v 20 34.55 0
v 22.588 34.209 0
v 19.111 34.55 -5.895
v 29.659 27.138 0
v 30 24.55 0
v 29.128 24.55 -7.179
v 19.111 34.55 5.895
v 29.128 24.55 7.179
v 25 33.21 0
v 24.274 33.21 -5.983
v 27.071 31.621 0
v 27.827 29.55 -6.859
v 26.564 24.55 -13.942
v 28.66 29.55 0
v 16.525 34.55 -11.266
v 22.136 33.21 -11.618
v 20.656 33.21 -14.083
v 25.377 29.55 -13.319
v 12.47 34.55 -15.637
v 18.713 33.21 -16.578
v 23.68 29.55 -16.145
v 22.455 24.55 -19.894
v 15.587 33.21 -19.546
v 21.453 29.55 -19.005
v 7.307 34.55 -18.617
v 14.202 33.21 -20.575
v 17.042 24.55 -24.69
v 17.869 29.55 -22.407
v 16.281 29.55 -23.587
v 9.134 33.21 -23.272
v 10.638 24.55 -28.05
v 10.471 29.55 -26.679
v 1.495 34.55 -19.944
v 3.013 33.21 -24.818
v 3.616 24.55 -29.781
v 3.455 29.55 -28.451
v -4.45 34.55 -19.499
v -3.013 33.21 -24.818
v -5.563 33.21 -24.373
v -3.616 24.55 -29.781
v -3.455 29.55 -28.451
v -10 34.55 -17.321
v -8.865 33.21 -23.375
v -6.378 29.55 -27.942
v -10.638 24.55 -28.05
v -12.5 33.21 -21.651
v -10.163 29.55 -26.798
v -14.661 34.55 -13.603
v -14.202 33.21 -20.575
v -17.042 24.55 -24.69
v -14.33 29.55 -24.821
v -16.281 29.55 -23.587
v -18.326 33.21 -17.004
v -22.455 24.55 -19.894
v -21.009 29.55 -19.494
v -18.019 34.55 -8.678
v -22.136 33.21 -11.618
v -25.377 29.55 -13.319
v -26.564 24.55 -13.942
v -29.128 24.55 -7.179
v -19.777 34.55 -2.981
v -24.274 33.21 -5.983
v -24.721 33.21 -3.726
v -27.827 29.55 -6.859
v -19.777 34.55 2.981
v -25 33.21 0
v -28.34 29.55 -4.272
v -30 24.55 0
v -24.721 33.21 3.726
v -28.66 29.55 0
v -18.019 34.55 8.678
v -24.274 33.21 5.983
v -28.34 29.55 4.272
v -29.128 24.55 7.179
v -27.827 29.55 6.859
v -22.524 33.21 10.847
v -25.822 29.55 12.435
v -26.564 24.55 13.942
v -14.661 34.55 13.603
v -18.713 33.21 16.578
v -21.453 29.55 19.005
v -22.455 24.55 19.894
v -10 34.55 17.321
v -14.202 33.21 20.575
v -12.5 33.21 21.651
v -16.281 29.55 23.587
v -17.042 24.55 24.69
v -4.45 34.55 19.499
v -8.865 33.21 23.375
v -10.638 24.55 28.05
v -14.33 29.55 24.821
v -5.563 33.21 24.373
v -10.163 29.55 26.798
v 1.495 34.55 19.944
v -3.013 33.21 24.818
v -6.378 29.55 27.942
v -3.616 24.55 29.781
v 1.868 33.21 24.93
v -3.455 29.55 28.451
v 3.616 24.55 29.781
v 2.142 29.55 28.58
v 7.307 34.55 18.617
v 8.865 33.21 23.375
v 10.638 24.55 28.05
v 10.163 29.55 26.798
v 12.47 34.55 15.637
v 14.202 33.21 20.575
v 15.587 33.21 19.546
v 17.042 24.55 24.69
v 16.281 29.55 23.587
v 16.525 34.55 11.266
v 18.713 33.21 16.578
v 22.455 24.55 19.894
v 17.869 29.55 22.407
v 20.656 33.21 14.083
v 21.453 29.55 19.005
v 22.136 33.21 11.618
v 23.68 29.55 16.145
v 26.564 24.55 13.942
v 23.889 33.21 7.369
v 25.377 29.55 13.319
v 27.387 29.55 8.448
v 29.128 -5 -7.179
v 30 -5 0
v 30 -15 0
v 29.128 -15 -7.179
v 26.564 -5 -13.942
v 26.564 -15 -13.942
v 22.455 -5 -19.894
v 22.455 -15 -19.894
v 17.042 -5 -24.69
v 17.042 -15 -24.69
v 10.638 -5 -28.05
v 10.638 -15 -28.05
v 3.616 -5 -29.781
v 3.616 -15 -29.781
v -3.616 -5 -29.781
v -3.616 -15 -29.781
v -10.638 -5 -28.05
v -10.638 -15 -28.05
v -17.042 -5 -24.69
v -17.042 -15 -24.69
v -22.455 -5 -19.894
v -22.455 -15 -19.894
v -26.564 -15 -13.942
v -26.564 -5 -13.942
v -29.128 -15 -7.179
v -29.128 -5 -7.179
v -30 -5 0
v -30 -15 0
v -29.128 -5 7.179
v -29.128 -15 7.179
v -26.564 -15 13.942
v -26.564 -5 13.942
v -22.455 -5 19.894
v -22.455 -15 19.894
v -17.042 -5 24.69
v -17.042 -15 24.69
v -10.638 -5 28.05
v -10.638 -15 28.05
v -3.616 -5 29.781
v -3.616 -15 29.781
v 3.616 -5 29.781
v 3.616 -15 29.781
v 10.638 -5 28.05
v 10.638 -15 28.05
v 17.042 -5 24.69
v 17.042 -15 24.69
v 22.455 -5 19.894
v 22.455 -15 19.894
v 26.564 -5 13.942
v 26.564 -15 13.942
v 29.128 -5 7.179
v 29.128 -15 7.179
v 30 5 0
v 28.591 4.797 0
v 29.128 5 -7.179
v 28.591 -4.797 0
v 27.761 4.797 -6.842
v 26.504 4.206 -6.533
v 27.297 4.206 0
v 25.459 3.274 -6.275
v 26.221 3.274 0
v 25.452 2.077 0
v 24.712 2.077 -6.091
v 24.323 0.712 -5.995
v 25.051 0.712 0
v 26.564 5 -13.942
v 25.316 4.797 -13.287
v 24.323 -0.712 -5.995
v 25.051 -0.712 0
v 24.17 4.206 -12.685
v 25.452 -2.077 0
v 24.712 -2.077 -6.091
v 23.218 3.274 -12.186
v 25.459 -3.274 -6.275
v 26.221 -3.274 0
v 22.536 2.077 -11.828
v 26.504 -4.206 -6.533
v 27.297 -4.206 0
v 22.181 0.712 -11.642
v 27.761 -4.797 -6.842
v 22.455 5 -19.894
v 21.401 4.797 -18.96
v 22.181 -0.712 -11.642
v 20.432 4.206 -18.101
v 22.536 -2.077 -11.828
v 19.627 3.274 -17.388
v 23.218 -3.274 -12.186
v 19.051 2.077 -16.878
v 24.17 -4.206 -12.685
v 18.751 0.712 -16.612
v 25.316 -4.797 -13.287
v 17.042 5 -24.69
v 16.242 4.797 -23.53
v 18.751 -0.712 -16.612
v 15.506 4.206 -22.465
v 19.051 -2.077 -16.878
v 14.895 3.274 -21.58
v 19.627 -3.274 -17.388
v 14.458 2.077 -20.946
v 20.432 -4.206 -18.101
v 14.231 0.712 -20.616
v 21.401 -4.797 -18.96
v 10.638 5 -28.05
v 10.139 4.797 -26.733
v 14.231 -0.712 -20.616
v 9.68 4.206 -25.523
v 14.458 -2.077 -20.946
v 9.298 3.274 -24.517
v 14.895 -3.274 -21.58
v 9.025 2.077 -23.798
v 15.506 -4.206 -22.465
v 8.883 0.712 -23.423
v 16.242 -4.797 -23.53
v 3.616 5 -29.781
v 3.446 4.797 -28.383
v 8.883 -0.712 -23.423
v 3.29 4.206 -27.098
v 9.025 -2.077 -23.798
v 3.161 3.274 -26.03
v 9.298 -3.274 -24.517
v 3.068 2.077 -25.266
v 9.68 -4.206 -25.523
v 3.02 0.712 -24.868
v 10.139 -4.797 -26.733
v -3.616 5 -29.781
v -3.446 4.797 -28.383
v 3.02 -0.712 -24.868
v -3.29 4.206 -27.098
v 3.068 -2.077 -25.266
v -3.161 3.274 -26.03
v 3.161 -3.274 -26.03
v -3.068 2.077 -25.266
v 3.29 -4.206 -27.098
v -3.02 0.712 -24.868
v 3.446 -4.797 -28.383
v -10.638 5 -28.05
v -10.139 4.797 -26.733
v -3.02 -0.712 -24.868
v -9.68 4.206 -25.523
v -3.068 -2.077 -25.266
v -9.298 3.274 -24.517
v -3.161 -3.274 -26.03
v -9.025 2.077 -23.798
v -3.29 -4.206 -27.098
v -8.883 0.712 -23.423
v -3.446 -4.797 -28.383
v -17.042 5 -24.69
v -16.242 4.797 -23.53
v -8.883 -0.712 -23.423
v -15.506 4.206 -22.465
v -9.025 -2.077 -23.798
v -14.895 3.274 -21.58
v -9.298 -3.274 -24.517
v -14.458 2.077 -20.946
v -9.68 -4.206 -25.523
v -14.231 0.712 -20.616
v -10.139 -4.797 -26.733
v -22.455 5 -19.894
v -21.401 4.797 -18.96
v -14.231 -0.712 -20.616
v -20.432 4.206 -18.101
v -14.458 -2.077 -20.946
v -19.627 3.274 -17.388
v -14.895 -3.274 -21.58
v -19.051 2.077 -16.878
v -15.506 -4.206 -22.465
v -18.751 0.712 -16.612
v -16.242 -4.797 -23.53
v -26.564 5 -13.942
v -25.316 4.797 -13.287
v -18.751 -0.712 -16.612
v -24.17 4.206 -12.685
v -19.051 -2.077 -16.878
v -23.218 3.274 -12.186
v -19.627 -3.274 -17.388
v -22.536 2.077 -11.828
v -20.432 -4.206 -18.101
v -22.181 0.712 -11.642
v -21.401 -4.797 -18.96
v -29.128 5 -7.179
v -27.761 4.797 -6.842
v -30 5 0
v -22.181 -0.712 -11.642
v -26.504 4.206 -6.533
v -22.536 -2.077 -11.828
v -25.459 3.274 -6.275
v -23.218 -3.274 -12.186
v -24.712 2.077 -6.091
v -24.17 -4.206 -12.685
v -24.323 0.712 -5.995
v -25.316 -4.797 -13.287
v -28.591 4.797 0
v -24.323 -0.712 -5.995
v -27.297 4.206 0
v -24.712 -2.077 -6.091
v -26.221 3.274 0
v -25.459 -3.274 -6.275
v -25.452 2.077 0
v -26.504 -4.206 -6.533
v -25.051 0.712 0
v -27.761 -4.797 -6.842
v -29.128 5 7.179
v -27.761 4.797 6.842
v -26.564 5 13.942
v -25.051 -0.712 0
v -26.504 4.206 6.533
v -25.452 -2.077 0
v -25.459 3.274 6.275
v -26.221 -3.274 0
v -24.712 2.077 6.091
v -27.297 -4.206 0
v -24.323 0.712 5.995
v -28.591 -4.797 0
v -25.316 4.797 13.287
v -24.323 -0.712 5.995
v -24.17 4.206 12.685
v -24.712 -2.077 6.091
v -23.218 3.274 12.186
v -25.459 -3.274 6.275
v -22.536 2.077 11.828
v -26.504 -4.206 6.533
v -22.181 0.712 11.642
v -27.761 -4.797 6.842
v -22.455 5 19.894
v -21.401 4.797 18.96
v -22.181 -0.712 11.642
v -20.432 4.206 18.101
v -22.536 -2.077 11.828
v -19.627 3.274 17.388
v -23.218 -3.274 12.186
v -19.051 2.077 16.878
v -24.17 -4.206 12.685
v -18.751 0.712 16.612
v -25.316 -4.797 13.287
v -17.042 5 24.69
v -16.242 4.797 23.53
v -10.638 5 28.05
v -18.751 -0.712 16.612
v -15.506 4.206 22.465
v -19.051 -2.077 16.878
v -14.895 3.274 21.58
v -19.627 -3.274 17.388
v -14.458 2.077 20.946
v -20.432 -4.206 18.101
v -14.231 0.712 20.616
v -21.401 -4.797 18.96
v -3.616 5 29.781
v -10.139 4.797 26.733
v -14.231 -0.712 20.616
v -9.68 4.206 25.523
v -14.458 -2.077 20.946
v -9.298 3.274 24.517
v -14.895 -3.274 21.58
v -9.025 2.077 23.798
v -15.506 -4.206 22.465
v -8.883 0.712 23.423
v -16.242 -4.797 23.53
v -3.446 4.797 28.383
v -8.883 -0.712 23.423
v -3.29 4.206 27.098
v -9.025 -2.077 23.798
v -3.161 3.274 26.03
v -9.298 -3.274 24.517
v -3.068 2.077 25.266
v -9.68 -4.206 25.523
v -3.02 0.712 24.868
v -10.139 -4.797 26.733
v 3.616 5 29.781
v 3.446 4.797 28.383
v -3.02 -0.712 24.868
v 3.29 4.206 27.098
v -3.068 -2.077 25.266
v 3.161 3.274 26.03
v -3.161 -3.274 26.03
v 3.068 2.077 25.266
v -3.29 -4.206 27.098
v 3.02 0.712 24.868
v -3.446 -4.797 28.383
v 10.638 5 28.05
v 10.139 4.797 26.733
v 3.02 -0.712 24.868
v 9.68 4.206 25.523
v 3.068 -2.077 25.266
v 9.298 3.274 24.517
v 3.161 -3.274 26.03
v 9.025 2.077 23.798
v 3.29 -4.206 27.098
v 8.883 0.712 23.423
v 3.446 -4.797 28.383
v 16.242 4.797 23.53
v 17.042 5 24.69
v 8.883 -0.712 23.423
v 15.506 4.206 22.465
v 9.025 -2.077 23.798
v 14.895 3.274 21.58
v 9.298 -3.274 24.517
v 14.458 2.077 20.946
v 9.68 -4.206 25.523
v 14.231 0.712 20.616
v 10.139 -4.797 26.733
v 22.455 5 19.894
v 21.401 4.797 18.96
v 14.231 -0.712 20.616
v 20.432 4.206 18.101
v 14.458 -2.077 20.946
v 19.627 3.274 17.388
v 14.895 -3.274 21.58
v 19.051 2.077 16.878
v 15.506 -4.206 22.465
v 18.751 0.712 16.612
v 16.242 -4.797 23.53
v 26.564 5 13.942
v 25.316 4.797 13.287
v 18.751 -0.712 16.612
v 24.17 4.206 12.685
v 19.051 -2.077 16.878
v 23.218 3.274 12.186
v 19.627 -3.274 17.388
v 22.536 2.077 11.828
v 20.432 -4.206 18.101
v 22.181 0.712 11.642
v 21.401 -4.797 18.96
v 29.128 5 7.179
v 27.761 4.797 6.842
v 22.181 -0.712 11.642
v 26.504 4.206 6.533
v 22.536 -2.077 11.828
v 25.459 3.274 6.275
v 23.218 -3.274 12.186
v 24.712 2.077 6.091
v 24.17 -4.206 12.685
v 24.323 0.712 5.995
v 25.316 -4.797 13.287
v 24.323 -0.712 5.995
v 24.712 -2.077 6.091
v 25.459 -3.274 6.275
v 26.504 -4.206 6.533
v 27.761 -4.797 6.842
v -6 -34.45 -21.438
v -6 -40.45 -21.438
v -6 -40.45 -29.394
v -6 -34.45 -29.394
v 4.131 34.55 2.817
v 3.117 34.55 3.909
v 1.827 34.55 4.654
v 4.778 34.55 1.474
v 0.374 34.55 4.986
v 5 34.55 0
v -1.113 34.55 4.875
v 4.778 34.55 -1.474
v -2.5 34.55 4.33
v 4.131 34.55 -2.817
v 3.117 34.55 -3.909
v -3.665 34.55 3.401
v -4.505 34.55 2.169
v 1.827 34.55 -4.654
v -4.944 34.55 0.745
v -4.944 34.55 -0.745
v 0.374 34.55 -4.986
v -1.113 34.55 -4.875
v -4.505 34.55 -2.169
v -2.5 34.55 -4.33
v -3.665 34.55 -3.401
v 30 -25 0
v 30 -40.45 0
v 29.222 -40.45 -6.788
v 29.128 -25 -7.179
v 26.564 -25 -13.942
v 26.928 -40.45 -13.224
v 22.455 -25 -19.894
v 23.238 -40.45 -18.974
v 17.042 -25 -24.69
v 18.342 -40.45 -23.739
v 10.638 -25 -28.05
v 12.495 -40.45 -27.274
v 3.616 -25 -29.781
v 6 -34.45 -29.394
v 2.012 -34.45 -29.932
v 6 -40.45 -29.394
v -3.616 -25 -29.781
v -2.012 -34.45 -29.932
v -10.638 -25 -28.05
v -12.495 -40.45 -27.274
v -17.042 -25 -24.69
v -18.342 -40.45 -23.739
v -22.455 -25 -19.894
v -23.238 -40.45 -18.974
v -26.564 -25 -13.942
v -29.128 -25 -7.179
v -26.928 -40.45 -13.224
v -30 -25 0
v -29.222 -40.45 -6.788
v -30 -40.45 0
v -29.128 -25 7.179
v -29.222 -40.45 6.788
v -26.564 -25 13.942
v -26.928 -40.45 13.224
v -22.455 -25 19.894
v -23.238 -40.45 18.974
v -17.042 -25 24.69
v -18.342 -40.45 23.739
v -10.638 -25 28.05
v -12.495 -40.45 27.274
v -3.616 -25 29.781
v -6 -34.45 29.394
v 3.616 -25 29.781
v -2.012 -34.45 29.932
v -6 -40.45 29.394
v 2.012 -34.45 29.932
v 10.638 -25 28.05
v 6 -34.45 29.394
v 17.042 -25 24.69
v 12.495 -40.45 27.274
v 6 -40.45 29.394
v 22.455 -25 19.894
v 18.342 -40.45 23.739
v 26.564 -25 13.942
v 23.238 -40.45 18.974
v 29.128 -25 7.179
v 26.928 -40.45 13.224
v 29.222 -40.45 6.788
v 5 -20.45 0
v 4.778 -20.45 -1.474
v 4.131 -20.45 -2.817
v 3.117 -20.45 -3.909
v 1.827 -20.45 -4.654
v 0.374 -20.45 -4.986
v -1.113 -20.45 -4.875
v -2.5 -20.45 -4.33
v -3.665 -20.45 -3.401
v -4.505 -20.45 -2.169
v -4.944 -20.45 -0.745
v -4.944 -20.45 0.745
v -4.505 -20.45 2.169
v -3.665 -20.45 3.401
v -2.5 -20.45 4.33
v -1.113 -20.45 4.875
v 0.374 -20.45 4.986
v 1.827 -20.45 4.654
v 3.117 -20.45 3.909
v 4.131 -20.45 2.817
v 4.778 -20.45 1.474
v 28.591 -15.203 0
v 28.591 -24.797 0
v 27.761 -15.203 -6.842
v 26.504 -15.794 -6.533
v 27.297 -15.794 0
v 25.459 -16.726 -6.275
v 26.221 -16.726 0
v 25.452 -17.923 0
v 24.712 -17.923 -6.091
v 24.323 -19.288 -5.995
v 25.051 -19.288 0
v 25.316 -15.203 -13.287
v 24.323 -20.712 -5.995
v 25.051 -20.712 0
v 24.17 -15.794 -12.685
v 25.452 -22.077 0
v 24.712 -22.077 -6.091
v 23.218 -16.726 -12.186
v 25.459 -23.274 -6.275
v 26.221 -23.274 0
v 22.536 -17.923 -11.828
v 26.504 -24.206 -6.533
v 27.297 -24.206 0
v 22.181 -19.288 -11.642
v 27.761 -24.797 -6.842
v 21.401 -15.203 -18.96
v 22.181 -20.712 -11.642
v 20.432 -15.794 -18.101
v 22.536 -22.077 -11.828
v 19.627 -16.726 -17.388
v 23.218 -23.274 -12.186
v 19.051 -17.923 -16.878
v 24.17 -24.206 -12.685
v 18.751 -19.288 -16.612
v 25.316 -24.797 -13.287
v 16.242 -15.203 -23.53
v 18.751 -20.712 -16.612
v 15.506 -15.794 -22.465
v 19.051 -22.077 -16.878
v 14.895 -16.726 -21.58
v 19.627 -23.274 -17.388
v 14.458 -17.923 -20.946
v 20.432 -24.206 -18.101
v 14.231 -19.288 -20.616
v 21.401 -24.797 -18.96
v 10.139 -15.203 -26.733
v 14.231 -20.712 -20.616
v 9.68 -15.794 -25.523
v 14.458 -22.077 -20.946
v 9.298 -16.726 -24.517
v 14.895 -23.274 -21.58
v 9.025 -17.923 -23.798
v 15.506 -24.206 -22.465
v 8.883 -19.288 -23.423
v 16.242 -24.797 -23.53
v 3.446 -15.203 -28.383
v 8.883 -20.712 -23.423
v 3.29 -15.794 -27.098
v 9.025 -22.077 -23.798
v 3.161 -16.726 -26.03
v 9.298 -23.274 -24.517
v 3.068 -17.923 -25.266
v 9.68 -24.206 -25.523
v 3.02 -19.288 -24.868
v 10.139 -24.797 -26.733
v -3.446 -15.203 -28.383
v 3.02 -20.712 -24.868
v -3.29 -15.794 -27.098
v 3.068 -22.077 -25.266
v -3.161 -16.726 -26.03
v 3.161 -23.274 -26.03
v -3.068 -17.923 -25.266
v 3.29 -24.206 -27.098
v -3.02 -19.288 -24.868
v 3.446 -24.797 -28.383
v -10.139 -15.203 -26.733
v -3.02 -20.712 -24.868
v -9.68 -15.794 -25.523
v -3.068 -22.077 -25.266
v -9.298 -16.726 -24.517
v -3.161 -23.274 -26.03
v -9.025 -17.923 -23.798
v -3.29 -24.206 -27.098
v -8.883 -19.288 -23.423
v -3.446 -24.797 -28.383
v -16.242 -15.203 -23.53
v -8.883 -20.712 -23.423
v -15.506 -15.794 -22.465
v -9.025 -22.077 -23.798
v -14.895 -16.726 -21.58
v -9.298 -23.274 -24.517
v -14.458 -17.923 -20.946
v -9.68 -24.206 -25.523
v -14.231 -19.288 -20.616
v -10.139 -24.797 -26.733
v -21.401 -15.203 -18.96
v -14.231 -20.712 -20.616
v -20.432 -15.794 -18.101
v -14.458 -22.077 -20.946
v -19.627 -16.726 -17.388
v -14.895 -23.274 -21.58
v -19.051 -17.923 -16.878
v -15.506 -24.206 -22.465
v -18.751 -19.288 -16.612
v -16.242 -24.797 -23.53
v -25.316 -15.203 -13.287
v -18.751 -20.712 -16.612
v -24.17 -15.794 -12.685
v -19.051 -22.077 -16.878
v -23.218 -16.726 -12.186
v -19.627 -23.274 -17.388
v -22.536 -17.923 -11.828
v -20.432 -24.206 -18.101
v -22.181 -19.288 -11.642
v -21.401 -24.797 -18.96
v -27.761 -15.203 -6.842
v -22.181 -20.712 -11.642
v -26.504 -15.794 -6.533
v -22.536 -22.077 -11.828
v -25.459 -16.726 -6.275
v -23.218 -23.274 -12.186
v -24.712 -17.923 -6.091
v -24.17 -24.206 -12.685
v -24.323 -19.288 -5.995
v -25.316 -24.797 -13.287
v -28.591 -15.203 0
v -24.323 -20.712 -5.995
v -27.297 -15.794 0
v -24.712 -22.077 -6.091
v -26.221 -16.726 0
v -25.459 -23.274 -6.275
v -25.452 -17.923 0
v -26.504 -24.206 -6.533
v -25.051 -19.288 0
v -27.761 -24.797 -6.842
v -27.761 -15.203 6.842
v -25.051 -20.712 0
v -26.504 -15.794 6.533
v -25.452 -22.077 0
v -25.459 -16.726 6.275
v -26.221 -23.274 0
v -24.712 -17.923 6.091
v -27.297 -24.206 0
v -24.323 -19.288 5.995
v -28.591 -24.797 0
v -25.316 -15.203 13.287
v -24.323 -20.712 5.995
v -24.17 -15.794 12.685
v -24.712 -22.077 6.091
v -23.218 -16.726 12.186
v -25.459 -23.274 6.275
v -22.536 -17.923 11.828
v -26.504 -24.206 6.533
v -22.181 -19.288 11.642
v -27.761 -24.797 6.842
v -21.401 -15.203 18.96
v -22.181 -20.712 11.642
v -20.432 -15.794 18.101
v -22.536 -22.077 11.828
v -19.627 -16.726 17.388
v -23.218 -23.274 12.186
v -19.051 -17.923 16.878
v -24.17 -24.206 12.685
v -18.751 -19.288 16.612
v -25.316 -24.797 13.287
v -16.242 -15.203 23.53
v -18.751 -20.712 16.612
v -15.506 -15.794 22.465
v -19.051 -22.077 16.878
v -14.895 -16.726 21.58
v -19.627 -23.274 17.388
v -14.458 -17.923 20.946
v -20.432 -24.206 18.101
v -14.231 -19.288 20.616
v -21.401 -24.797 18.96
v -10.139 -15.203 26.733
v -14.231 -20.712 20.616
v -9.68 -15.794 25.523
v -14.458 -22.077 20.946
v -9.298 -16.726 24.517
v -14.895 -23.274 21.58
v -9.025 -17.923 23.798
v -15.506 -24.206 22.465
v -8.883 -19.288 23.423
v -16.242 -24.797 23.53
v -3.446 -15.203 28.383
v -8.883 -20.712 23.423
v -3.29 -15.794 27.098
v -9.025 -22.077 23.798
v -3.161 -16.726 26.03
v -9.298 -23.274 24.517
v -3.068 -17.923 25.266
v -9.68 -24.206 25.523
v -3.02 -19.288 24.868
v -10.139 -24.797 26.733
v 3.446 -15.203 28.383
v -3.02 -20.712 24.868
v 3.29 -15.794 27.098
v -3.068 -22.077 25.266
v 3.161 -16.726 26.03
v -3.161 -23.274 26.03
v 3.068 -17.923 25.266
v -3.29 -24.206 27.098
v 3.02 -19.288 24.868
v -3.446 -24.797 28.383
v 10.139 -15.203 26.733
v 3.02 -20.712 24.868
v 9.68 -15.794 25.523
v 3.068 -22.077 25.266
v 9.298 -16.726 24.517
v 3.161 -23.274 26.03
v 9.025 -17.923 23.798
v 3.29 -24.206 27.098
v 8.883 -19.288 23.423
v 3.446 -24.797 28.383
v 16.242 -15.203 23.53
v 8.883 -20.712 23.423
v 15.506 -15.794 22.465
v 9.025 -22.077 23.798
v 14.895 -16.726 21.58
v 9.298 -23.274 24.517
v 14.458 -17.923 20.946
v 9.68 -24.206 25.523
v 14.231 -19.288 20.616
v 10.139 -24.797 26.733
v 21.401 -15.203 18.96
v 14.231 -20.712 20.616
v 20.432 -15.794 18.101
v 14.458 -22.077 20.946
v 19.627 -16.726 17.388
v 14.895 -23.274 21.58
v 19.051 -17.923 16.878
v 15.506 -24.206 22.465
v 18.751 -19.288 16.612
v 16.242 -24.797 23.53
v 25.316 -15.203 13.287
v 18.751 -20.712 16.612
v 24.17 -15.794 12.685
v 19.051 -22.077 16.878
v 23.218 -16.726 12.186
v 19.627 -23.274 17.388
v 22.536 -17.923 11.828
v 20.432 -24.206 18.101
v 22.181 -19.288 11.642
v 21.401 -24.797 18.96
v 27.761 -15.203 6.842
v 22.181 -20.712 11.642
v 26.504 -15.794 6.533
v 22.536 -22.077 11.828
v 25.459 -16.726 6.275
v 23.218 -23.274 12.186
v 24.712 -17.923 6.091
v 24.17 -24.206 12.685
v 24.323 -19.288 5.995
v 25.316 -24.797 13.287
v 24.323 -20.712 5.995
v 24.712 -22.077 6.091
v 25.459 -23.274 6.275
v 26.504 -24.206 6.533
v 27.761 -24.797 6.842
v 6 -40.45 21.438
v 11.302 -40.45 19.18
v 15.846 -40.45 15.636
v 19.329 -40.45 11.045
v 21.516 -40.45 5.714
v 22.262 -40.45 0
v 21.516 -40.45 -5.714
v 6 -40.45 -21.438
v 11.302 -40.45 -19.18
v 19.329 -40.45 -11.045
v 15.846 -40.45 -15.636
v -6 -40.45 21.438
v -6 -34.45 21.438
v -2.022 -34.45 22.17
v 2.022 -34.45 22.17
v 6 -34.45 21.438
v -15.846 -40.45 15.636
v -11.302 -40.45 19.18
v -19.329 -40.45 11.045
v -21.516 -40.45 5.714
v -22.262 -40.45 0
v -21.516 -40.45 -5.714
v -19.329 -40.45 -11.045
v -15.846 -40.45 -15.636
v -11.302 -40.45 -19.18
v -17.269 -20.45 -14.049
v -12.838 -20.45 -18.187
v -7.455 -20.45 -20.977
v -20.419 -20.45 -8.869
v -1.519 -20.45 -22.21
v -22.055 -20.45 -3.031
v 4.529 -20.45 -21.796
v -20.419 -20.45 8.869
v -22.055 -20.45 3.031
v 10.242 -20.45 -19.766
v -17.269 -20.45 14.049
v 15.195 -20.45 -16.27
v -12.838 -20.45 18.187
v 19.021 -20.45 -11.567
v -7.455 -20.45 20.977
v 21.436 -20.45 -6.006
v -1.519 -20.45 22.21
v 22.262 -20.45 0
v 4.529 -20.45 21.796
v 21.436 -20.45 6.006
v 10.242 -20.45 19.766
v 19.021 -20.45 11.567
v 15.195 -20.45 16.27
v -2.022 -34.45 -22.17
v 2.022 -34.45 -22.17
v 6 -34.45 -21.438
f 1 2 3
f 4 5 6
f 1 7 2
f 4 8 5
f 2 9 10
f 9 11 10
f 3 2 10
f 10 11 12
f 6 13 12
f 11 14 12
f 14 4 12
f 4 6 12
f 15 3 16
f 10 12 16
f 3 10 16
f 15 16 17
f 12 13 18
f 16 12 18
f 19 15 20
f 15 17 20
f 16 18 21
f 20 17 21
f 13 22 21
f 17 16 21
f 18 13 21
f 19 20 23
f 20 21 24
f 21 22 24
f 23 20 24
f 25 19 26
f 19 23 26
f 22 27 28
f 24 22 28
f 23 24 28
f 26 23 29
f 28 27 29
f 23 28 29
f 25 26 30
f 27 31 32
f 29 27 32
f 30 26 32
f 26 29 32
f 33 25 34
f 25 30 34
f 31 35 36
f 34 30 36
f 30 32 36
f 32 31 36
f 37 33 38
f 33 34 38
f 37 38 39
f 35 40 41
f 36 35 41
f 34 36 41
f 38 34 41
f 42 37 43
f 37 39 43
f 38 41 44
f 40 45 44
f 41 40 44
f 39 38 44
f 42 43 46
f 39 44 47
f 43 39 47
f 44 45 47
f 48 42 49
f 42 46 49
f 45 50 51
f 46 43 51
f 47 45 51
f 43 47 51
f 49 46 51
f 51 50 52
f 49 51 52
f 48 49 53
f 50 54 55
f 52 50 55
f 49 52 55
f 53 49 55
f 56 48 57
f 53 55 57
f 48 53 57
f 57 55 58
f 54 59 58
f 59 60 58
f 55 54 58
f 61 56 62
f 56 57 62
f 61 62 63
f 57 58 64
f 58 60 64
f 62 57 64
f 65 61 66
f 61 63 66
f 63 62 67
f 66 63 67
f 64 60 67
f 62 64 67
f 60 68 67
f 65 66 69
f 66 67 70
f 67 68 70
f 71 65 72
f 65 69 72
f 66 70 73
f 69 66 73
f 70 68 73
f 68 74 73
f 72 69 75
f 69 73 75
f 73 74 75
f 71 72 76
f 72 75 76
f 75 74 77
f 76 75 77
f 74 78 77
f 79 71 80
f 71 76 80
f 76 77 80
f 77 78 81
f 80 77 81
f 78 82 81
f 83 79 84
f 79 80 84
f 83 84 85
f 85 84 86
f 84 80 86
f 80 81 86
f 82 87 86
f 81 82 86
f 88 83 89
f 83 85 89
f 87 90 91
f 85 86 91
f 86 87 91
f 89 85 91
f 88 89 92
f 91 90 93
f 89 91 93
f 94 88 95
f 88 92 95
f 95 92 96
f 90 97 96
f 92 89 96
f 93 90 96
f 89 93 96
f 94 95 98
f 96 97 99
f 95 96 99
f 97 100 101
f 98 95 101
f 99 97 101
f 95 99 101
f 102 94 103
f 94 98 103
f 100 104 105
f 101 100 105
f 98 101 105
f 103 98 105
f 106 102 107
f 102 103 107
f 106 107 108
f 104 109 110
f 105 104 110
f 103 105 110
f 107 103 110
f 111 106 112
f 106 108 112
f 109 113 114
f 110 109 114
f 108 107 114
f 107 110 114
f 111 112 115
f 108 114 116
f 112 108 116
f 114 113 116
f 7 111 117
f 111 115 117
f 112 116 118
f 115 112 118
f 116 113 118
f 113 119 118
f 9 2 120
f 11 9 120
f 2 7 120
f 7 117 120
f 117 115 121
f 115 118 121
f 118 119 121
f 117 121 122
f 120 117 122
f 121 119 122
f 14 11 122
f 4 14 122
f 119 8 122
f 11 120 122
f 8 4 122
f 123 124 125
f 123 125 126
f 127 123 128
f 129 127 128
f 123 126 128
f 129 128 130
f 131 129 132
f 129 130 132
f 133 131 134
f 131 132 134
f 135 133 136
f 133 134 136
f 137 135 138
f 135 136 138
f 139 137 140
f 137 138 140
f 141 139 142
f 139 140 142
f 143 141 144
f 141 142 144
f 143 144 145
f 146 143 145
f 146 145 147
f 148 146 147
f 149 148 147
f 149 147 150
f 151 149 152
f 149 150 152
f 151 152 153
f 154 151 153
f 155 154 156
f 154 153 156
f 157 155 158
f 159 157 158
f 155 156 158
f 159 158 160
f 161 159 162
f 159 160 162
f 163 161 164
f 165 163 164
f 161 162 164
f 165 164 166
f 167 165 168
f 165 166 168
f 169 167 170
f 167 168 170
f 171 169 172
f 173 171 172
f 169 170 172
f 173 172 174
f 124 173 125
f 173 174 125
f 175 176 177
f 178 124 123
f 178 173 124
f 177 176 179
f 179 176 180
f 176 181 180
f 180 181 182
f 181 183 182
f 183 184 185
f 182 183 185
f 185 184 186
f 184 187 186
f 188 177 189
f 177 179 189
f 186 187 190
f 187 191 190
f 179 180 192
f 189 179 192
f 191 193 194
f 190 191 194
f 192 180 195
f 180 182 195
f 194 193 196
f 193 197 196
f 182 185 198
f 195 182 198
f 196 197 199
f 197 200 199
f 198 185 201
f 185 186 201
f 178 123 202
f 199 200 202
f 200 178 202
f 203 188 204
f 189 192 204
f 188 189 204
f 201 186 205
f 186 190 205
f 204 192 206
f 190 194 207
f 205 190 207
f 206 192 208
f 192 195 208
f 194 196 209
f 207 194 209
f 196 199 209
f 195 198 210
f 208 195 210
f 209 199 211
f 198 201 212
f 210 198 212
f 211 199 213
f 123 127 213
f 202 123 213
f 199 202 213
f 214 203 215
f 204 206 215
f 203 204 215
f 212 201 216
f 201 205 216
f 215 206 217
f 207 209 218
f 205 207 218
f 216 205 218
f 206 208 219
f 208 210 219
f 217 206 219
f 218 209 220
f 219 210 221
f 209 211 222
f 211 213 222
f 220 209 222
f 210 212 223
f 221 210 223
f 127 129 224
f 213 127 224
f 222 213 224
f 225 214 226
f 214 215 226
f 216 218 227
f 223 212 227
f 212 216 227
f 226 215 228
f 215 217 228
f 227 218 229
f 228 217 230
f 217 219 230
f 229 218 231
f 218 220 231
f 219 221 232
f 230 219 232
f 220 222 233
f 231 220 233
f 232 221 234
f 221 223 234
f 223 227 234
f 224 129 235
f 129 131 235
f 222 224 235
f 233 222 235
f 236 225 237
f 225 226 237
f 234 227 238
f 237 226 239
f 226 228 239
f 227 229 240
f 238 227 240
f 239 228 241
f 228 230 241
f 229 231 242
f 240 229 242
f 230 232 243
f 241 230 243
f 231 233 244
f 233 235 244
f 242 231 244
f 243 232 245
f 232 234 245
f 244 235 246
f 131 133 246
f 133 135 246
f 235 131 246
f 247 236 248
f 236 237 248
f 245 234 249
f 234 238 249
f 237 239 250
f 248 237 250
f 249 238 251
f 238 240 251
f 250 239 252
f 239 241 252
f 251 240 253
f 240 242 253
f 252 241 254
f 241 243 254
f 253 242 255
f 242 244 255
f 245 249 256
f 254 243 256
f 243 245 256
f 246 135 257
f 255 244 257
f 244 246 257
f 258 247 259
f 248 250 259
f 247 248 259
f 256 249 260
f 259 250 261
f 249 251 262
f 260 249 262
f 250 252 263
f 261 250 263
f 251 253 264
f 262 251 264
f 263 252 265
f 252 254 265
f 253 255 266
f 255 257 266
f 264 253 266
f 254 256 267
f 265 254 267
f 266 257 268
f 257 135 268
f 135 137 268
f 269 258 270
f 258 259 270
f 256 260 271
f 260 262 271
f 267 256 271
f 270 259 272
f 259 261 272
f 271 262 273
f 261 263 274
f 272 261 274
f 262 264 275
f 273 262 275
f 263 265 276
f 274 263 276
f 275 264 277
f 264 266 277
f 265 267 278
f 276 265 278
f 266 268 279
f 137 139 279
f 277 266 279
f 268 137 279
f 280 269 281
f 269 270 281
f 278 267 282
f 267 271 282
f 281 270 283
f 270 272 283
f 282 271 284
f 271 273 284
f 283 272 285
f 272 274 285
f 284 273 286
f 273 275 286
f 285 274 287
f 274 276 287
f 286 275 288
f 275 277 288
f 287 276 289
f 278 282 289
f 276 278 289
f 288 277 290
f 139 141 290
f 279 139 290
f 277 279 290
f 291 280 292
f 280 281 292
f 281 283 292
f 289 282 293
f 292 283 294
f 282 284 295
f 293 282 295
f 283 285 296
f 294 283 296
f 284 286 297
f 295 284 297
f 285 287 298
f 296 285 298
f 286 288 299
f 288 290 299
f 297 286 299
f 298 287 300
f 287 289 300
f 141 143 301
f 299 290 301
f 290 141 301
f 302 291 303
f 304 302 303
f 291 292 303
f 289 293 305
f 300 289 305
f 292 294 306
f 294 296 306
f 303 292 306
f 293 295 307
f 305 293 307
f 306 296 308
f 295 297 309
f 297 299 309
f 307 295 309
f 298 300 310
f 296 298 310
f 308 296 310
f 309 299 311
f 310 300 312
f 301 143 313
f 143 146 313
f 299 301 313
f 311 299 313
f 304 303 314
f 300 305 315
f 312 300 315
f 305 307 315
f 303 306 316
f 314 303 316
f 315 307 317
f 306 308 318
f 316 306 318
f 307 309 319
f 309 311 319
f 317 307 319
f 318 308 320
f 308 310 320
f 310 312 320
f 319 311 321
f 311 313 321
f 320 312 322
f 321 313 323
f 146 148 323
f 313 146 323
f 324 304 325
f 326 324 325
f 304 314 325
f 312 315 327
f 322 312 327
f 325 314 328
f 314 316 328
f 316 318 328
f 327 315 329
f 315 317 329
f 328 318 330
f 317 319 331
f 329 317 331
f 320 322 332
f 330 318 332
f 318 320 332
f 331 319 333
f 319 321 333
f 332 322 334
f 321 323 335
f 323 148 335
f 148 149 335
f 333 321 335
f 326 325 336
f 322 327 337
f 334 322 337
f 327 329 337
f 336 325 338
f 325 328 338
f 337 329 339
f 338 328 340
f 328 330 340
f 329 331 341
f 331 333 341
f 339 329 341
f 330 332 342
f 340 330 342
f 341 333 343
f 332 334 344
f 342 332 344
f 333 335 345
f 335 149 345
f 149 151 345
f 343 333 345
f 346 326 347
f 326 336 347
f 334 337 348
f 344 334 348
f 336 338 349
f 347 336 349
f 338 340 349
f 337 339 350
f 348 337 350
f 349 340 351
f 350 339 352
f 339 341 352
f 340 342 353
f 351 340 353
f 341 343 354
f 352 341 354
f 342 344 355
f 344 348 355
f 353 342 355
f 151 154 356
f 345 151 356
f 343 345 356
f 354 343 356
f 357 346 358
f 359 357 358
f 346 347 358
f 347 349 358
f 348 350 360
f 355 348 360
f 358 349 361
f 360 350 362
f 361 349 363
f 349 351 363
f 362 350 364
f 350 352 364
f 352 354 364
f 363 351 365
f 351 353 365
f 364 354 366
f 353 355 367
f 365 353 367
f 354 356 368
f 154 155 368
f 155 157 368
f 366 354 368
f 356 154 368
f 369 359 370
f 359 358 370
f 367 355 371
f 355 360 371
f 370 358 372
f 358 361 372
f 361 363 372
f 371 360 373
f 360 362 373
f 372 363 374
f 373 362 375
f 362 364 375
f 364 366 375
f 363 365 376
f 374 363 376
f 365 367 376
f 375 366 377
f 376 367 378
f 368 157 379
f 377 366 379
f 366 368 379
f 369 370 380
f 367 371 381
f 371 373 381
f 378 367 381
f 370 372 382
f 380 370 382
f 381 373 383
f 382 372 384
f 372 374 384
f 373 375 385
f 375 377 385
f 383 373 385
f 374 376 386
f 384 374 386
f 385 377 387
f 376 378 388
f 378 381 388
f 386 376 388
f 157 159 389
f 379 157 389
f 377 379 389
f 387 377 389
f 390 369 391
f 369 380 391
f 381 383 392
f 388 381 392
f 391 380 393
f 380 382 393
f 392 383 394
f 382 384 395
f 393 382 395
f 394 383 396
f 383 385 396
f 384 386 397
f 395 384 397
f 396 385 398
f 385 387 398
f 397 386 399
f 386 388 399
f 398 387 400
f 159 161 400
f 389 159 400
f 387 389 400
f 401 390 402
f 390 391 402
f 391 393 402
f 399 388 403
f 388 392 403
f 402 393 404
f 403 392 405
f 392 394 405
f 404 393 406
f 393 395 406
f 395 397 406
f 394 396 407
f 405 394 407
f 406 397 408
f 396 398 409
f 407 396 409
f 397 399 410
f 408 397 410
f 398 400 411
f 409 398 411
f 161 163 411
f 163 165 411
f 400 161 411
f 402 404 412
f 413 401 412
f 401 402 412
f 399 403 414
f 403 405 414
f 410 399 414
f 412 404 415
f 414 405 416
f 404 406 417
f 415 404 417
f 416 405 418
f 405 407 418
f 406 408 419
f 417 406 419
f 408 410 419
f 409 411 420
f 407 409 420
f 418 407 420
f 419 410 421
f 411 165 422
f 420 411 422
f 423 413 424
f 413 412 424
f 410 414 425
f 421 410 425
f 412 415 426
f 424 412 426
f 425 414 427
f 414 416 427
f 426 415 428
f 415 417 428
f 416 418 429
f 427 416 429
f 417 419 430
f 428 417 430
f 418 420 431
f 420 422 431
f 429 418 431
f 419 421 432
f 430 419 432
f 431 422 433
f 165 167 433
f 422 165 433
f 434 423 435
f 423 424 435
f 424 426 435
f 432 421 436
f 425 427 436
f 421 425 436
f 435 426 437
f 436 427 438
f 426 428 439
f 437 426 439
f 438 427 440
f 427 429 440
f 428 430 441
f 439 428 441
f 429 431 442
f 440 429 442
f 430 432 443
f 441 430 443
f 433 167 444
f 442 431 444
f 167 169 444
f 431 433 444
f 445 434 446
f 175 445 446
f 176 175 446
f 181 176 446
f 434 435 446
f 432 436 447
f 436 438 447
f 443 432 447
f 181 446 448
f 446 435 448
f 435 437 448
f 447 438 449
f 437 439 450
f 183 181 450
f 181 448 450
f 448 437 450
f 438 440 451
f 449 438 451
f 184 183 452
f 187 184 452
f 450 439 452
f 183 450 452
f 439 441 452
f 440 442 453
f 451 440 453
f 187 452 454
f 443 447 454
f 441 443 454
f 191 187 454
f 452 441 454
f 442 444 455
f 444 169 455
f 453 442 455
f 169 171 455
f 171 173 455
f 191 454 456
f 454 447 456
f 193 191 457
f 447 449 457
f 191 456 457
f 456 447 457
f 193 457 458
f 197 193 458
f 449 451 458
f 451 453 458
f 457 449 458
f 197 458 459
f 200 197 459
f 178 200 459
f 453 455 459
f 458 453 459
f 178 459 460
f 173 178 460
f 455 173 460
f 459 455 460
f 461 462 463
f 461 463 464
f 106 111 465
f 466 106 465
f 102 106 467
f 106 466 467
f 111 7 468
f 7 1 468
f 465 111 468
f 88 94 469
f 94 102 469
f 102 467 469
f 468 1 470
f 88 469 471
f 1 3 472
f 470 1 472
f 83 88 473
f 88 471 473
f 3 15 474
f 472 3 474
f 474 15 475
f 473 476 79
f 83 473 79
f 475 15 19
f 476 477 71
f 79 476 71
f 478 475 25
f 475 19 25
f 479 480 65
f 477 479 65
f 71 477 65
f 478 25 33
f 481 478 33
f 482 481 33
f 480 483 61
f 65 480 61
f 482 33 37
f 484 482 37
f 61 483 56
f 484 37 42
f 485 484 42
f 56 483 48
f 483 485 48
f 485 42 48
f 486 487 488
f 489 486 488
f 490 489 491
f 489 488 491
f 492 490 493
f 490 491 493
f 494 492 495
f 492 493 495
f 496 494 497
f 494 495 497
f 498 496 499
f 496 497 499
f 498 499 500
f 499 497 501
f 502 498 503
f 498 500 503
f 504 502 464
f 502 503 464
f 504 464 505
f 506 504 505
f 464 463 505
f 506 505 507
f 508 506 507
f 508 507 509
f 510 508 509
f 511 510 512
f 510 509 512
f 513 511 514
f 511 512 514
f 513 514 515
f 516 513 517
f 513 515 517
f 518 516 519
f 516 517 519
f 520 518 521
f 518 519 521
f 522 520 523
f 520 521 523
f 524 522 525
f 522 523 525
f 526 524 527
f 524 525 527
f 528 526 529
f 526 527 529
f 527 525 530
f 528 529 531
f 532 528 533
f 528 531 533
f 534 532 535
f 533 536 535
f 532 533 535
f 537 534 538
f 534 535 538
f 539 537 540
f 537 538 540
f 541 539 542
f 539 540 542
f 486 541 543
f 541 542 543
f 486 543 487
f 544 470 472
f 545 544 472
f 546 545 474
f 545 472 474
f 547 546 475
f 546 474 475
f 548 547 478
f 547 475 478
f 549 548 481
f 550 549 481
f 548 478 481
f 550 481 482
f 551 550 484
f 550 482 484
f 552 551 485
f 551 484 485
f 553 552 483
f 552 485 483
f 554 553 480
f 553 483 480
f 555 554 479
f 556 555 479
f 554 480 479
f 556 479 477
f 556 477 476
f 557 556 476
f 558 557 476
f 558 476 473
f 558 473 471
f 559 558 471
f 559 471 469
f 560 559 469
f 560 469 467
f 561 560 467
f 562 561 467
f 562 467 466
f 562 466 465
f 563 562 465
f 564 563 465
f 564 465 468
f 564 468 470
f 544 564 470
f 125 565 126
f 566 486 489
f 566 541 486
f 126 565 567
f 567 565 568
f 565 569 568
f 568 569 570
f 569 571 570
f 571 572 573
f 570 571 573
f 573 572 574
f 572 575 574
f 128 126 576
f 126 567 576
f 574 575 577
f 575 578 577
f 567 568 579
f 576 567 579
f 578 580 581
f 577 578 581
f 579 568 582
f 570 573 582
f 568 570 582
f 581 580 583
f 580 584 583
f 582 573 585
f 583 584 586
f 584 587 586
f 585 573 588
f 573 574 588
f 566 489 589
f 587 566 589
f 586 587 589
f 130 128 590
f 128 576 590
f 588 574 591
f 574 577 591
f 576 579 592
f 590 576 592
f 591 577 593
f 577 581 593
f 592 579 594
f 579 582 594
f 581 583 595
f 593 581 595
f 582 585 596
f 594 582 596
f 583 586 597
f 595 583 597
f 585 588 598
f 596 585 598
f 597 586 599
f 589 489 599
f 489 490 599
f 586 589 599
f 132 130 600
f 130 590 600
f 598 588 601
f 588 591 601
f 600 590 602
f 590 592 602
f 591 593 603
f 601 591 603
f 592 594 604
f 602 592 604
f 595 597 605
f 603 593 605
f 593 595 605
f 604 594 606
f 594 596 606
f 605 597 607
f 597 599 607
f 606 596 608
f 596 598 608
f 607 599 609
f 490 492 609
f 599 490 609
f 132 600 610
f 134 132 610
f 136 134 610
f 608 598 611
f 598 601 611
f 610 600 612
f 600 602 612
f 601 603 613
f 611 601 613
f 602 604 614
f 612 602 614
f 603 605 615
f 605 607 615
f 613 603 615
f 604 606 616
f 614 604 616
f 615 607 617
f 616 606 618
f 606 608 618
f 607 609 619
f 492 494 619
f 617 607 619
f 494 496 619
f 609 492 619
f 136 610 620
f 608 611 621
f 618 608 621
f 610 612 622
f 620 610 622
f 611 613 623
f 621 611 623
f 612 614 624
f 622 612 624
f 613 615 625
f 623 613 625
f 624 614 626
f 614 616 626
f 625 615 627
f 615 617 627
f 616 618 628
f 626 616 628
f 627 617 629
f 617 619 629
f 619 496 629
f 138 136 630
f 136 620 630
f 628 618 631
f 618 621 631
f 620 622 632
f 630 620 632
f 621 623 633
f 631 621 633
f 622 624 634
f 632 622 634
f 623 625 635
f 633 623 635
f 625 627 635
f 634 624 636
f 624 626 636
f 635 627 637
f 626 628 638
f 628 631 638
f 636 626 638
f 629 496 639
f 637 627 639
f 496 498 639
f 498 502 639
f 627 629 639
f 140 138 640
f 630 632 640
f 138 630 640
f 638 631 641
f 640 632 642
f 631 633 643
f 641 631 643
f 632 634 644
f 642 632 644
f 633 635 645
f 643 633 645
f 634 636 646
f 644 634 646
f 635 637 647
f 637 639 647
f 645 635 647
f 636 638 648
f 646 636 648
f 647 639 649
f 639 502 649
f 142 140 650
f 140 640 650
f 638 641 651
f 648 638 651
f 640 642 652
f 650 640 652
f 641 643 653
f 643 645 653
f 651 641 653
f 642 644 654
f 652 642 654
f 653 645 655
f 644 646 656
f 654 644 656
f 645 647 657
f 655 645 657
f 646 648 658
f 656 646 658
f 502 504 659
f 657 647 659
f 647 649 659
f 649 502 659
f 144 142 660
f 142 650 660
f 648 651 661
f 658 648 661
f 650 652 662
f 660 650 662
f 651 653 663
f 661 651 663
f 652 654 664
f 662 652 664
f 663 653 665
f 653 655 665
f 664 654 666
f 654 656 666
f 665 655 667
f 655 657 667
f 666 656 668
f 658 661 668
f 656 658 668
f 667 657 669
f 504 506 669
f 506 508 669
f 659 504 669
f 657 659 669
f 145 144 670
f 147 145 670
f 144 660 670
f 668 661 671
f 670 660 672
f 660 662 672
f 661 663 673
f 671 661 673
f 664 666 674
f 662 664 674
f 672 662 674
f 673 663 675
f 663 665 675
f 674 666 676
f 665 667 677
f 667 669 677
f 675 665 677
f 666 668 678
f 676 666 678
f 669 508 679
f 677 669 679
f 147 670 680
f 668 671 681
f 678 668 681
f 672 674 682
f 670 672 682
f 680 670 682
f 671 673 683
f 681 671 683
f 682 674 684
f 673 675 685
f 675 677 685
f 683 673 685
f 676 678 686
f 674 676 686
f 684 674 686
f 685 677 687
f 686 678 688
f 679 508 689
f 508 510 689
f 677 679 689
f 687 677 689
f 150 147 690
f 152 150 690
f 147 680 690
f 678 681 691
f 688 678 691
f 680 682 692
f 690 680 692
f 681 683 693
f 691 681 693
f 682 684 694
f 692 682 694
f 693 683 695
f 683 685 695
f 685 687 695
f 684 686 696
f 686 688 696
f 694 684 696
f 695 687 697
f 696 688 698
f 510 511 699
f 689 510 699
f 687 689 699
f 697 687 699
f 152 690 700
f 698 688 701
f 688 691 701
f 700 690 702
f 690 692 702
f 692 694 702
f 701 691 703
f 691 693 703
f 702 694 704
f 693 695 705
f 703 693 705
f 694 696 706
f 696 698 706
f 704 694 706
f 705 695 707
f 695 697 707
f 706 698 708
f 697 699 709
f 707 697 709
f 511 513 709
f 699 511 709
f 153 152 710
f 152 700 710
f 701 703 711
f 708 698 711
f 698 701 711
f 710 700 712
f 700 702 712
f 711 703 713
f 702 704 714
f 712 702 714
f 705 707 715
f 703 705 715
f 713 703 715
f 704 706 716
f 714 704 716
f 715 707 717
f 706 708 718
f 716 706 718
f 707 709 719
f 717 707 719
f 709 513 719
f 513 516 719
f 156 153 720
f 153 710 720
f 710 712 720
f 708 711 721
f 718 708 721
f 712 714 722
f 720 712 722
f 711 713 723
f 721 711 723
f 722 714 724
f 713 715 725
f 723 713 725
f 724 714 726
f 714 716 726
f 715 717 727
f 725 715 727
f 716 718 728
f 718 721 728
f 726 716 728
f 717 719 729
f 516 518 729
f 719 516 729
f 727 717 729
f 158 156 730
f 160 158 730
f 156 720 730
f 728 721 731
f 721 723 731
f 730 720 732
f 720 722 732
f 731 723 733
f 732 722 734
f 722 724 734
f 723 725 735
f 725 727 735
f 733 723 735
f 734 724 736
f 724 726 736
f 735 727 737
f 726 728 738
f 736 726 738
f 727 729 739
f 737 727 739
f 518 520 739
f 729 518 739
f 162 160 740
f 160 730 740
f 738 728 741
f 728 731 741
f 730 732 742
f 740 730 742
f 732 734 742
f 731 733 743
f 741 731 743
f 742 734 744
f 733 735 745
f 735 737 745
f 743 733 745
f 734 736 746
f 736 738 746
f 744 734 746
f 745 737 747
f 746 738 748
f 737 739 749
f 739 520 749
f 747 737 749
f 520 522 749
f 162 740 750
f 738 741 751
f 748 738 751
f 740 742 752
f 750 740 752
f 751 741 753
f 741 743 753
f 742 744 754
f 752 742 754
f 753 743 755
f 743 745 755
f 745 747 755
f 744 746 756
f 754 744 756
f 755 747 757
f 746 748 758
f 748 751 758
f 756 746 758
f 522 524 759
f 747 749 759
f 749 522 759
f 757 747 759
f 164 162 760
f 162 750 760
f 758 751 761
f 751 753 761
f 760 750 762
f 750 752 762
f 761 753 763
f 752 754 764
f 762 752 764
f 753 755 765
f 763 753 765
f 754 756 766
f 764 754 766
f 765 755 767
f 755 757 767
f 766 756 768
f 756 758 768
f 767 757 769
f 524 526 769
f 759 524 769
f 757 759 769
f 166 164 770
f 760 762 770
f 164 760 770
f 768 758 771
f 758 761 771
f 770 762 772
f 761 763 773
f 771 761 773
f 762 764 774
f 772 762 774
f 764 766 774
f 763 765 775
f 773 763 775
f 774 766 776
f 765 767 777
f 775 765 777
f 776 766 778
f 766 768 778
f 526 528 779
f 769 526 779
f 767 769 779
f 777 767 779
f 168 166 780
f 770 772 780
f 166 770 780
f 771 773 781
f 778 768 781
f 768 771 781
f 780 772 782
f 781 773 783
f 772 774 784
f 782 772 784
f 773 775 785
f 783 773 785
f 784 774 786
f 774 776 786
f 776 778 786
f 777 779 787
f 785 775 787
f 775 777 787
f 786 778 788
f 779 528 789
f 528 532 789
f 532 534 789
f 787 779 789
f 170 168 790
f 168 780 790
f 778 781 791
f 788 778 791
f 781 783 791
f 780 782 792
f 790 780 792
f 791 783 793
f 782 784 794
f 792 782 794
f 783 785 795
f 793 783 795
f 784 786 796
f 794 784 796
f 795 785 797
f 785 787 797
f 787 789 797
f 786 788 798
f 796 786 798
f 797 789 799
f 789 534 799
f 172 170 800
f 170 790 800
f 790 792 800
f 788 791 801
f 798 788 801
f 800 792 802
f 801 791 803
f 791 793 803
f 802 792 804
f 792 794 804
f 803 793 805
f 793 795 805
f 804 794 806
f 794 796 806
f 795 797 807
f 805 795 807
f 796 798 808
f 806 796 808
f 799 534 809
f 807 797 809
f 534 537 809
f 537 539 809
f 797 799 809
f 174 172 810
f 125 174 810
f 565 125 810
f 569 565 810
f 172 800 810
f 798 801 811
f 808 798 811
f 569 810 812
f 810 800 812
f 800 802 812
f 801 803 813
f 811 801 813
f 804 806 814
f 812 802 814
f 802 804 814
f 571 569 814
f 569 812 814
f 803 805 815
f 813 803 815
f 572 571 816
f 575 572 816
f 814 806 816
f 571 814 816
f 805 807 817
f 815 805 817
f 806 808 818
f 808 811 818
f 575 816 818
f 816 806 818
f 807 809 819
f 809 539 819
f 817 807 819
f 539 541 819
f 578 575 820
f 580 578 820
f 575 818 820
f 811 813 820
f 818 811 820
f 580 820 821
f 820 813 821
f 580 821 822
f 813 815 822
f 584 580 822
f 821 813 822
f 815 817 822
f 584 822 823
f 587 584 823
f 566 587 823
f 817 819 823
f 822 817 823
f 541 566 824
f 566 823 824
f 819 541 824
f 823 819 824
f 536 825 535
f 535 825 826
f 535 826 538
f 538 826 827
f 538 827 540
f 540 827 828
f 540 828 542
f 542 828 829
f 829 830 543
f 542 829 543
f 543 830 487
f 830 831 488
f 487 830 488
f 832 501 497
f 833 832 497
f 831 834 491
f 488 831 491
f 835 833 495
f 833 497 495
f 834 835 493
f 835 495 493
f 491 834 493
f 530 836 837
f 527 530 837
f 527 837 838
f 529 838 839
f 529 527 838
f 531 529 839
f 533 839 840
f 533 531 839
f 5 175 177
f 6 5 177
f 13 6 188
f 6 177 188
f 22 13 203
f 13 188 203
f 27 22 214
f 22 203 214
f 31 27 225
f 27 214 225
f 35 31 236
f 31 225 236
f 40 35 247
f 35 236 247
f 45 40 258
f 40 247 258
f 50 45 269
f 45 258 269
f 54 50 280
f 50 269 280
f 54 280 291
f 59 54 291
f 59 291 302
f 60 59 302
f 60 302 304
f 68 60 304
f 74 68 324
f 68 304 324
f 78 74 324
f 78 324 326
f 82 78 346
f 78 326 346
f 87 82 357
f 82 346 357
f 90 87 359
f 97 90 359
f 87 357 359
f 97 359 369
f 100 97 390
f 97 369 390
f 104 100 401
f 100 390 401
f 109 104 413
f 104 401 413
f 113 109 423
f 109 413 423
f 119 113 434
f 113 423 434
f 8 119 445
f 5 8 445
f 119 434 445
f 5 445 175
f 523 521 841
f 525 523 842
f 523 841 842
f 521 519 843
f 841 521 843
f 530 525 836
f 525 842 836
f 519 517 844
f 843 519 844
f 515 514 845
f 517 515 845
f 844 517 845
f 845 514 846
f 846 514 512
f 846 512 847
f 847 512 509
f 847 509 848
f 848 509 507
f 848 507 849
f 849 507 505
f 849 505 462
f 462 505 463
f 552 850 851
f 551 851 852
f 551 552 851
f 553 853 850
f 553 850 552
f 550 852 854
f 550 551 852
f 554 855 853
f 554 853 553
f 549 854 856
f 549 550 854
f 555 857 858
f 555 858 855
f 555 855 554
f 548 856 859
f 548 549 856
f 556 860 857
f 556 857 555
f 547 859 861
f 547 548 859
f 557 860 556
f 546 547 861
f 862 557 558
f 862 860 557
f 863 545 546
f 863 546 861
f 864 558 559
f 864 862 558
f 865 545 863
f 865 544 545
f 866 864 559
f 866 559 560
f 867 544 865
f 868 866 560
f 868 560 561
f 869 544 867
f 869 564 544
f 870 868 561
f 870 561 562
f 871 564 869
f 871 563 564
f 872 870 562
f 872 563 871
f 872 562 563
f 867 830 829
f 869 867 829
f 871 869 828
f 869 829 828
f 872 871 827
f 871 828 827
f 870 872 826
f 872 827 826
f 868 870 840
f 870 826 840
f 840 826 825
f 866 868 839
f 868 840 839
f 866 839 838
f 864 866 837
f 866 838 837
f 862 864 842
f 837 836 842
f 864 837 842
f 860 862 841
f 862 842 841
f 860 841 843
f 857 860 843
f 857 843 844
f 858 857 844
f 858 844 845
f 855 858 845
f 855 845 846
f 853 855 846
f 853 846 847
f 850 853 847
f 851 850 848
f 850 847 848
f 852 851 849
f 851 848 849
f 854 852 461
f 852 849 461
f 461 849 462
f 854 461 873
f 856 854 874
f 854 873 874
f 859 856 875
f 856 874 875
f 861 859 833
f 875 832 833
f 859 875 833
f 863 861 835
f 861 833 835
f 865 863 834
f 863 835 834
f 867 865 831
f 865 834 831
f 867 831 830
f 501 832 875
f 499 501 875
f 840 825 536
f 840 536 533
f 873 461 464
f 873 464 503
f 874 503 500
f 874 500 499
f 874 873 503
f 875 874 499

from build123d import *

# Parameters (mm, degrees)
SKETCH2_R          = 5
SKETCH3_R          = 5
CUT_EXTRUDE1_DEPTH = 76
SKETCH4_R          = 22.261929886
CUT_EXTRUDE2_DEPTH = 20
SKETCH5_W          = 12
SKETCH5_H          = 6
CUT_EXTRUDE3_DEPTH = 35


with BuildPart() as part:
    # Sketch1 → Revolve1 (revolve)
    with BuildSketch(Plane.XY):
        with BuildLine():
            Line((0, -40.450423349), (0, 34.549576651))
            Line((0, 34.549576651), (20, 34.549576651))
            ThreePointArc((20, 34.549576651), (27.071067812, 31.620644463), (30, 24.549576651))
            Line((30, 24.549576651), (30, -40.450423349))
            Line((30, -40.450423349), (0, -40.450423349))
        make_face()
    revolve(axis=Axis((0, -40.450423349, 0), (0, 1, 0)))

    # Sketch2 → Cut-Revolve1 (revolve, cut)
    with BuildSketch(Plane.XY):
        with Locations((30, 0)):
            Circle(SKETCH2_R)
        with Locations((30, -20)):
            Circle(SKETCH2_R)
    revolve(axis=Axis((0, -46.378397734, 0), (0, 1, 0)), mode=Mode.SUBTRACT)

    # Sketch3 → Cut-Extrude1 (cut, through all)
    with BuildSketch(Plane(origin=(0, 34.549576651, 0), x_dir=(1, 0, 0), z_dir=(0, 1, 0))):
        Circle(SKETCH3_R)
    extrude(amount=-CUT_EXTRUDE1_DEPTH, mode=Mode.SUBTRACT)

    # Sketch4 → Cut-Extrude2 (cut)
    with BuildSketch(Plane.XZ.offset(40.450423349)):
        Circle(SKETCH4_R)
    extrude(amount=-CUT_EXTRUDE2_DEPTH, mode=Mode.SUBTRACT)

    # Sketch5 → Cut-Extrude3 (cut, symmetric)
    with BuildSketch(Plane.XY):
        with Locations((0, -37.450423349)):
            Rectangle(SKETCH5_W, SKETCH5_H)
    extrude(amount=CUT_EXTRUDE3_DEPTH, both=True, mode=Mode.SUBTRACT)


solid = part.part
